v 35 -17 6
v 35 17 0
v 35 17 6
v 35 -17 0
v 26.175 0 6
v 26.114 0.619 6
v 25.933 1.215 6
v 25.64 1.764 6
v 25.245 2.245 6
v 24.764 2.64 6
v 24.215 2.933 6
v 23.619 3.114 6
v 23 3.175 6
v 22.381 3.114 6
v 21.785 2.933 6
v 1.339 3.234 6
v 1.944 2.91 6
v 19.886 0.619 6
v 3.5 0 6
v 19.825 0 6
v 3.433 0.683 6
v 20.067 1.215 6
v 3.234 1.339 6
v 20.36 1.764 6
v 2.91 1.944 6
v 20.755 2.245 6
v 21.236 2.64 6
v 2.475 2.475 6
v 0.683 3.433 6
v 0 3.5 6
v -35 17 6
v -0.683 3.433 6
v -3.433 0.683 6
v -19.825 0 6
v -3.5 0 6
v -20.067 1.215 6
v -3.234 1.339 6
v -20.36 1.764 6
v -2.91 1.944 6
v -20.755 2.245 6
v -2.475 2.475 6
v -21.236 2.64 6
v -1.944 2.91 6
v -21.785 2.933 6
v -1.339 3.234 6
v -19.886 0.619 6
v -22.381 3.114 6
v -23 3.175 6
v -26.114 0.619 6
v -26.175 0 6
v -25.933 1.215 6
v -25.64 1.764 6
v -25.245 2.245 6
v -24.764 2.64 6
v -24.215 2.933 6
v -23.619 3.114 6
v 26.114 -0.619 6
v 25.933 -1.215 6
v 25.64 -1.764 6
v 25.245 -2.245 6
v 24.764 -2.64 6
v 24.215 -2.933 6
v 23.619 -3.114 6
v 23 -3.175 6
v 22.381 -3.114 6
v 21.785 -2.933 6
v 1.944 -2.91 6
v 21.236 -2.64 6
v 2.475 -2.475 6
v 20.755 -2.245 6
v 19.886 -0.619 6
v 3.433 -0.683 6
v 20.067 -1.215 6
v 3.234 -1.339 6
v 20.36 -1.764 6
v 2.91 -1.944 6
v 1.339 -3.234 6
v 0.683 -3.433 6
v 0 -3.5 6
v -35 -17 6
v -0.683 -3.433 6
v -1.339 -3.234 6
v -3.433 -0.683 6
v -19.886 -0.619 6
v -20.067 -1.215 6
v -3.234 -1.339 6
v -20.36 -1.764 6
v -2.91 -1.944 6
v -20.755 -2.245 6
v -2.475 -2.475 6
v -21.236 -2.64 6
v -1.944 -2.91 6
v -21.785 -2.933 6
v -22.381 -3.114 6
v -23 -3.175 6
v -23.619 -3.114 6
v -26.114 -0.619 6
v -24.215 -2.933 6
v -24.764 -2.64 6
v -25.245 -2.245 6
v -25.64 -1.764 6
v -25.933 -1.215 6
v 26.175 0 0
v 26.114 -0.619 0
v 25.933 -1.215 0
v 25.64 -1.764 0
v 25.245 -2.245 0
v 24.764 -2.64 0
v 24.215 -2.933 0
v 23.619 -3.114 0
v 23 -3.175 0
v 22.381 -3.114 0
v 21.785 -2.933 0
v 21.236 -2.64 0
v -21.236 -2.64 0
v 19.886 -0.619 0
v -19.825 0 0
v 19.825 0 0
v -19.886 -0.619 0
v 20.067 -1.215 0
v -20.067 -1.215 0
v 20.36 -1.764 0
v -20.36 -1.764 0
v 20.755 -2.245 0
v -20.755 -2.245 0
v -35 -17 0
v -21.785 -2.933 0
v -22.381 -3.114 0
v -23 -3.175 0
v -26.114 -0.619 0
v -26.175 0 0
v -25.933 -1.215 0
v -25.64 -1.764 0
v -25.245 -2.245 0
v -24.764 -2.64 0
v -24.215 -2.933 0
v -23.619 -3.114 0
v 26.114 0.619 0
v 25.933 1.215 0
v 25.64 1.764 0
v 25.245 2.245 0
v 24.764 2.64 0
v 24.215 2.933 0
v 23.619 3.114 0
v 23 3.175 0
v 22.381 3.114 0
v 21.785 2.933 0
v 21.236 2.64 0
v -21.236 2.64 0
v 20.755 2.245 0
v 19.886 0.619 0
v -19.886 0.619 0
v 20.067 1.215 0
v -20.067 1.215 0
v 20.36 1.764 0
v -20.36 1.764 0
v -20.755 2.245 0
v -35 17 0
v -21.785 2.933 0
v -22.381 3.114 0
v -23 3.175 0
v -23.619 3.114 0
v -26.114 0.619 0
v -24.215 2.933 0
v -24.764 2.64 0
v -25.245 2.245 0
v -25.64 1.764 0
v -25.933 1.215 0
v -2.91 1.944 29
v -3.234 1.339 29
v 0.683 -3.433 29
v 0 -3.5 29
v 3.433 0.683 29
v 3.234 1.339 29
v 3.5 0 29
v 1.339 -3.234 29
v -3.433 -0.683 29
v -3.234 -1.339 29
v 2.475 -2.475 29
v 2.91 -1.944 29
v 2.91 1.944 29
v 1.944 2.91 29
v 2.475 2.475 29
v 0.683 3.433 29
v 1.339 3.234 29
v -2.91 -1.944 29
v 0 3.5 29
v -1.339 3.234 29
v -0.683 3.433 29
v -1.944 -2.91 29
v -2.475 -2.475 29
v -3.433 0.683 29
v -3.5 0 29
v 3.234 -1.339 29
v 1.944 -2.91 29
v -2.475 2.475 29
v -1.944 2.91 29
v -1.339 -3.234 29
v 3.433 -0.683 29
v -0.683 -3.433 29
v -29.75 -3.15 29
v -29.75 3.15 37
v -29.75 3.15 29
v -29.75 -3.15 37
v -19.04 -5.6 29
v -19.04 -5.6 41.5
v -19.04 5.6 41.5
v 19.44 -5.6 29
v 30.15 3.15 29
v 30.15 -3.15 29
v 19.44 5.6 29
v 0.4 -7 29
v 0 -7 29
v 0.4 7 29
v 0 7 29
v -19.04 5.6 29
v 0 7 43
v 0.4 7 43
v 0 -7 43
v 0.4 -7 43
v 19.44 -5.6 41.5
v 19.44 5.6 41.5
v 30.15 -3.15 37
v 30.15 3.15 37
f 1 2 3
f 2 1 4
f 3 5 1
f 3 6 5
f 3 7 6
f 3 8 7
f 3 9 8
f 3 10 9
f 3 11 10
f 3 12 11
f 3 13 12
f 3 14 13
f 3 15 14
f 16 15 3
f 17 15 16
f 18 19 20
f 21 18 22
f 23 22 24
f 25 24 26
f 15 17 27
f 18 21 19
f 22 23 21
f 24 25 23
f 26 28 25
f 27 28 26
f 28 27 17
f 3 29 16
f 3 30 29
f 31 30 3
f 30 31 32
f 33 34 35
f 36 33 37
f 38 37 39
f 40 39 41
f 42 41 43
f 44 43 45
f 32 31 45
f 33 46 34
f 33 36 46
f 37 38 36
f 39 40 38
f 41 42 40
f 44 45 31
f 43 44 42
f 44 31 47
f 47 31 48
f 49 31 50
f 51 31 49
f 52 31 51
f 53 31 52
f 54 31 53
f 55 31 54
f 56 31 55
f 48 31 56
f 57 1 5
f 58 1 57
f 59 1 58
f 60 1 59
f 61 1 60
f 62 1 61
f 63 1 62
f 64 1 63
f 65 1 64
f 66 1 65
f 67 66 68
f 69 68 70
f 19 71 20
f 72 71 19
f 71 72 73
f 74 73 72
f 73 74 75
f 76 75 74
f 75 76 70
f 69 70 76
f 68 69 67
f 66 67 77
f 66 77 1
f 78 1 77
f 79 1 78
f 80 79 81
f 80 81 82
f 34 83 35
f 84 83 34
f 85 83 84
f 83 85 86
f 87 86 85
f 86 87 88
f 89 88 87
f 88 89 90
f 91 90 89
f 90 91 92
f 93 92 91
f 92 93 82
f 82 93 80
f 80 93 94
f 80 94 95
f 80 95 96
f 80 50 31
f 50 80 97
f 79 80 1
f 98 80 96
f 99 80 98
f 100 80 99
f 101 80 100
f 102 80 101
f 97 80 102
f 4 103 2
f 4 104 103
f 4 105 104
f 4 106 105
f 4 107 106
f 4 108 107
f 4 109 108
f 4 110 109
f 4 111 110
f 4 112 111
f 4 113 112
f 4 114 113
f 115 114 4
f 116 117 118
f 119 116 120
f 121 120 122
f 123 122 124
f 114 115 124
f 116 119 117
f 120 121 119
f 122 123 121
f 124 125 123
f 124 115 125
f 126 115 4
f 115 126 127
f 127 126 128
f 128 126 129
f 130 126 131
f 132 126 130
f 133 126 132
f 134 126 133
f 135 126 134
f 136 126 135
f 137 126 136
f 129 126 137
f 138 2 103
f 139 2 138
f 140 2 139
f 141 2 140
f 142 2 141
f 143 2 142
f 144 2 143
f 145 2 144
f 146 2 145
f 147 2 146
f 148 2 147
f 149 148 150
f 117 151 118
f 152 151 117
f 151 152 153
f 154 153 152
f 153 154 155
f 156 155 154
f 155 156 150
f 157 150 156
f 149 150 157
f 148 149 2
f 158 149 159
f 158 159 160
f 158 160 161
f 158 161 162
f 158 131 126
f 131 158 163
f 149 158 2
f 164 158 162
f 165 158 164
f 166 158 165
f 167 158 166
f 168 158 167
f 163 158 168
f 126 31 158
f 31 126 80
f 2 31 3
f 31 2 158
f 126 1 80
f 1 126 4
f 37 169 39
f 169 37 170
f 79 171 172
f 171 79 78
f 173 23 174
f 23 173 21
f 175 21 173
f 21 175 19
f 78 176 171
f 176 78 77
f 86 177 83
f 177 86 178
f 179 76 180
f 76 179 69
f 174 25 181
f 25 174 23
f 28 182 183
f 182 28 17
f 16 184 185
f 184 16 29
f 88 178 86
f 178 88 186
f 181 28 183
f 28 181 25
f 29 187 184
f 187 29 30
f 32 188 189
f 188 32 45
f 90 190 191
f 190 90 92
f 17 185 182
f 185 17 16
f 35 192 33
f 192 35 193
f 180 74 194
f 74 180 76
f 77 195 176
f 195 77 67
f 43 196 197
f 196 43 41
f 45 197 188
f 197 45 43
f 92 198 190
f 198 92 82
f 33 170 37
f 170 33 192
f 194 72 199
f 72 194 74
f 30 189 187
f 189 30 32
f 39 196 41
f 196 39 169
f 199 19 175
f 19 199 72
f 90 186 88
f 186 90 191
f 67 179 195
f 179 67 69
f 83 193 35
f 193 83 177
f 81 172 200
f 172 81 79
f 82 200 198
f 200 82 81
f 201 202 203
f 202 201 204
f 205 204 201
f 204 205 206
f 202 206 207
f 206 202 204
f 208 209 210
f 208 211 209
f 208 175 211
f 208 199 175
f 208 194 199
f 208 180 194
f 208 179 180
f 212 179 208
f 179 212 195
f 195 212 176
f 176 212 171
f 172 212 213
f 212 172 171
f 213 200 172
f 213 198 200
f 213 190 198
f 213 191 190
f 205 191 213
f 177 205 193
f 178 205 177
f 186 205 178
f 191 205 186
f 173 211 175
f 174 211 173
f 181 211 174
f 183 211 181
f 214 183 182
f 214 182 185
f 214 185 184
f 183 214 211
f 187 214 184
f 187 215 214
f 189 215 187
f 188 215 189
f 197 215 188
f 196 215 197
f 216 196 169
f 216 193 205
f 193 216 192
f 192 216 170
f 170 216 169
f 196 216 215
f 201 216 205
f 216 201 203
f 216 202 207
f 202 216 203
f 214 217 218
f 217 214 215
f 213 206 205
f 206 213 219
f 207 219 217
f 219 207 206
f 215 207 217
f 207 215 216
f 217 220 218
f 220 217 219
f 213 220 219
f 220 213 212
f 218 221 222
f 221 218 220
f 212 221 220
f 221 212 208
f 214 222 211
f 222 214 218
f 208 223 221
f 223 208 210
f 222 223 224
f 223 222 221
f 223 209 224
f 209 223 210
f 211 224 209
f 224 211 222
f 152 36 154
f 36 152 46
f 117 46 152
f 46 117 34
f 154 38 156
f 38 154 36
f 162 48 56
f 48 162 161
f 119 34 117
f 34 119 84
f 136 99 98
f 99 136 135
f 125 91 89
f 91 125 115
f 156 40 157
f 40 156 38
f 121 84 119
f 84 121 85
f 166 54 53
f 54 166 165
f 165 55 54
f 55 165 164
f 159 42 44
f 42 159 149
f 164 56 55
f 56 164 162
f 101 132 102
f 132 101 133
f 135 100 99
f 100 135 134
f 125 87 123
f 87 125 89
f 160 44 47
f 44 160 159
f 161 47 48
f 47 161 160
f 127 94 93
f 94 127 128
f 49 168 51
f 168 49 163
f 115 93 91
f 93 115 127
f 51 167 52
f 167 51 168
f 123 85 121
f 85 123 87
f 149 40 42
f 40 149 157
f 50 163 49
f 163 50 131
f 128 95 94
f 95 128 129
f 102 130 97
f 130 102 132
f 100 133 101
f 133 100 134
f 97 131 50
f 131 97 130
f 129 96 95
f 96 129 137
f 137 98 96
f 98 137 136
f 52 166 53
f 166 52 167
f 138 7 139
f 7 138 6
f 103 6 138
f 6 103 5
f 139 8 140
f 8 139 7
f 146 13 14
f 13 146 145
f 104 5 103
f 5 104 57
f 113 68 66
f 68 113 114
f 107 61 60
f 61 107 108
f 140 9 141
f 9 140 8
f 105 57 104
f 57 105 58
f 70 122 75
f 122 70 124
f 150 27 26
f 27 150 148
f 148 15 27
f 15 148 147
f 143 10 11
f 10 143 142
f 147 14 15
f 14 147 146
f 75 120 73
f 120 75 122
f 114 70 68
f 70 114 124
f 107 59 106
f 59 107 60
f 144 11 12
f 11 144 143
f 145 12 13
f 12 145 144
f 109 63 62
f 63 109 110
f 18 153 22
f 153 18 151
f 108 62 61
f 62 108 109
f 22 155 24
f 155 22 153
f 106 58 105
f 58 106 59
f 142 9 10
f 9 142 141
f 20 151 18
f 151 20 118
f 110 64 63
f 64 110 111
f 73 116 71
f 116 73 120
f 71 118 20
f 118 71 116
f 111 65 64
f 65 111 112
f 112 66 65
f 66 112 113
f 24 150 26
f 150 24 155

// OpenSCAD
$fn = 32;

// ----------------------------------------------------------------------
// Boat cleat: 70 mm base, horn 36 mm up
// ----------------------------------------------------------------------

// --- parameters (mm) ---
base_l = 70;              // base length
base_w = 34;              // base width
base_t = 6;               // base thickness
horn_len = 59.5;          // horn length
horn_d = 14;              // horn diameter at the middle
horn_z = 36;              // horn axis height
end_drop = 6;             // how far the horn tips drop
post_d = 7;               // centre post diameter
holes_d = 6.35;           // fixing holes
hole_x = 23;              // fixing hole spacing

difference() {
  union() {
    translate([-35, -17, 0]) cube([base_l, base_w, base_t]);
    /* centre post, sunk 1 mm into the base */
    translate([0, 0, 5]) cylinder(h = 31, d = post_d);
    /* horn: a hull chain of boxes, full in the middle and lighter at the tips */
    hull() {
      translate([-29.75, -3.15, 29]) cube([0.4, 6.3, 8], center = false);
      translate([-19.04, -5.6, 29]) cube([0.4, 11.2, 12.5], center = false);
    }
    hull() {
      translate([-19.04, -5.6, 29]) cube([0.4, 11.2, 12.5], center = false);
      translate([0, -7, 29]) cube([0.4, 14, 14], center = false);
    }
    hull() {
      translate([0, -7, 29]) cube([0.4, 14, 14], center = false);
      translate([19.04, -5.6, 29]) cube([0.4, 11.2, 12.5], center = false);
    }
    hull() {
      translate([19.04, -5.6, 29]) cube([0.4, 11.2, 12.5], center = false);
      translate([29.75, -3.15, 29]) cube([0.4, 6.3, 8], center = false);
    }
  }
  translate([-23, 0, -2.5]) cylinder(h = base_t + 5, d = holes_d);
  translate([23, 0, -2.5]) cylinder(h = base_t + 5, d = holes_d);
}
